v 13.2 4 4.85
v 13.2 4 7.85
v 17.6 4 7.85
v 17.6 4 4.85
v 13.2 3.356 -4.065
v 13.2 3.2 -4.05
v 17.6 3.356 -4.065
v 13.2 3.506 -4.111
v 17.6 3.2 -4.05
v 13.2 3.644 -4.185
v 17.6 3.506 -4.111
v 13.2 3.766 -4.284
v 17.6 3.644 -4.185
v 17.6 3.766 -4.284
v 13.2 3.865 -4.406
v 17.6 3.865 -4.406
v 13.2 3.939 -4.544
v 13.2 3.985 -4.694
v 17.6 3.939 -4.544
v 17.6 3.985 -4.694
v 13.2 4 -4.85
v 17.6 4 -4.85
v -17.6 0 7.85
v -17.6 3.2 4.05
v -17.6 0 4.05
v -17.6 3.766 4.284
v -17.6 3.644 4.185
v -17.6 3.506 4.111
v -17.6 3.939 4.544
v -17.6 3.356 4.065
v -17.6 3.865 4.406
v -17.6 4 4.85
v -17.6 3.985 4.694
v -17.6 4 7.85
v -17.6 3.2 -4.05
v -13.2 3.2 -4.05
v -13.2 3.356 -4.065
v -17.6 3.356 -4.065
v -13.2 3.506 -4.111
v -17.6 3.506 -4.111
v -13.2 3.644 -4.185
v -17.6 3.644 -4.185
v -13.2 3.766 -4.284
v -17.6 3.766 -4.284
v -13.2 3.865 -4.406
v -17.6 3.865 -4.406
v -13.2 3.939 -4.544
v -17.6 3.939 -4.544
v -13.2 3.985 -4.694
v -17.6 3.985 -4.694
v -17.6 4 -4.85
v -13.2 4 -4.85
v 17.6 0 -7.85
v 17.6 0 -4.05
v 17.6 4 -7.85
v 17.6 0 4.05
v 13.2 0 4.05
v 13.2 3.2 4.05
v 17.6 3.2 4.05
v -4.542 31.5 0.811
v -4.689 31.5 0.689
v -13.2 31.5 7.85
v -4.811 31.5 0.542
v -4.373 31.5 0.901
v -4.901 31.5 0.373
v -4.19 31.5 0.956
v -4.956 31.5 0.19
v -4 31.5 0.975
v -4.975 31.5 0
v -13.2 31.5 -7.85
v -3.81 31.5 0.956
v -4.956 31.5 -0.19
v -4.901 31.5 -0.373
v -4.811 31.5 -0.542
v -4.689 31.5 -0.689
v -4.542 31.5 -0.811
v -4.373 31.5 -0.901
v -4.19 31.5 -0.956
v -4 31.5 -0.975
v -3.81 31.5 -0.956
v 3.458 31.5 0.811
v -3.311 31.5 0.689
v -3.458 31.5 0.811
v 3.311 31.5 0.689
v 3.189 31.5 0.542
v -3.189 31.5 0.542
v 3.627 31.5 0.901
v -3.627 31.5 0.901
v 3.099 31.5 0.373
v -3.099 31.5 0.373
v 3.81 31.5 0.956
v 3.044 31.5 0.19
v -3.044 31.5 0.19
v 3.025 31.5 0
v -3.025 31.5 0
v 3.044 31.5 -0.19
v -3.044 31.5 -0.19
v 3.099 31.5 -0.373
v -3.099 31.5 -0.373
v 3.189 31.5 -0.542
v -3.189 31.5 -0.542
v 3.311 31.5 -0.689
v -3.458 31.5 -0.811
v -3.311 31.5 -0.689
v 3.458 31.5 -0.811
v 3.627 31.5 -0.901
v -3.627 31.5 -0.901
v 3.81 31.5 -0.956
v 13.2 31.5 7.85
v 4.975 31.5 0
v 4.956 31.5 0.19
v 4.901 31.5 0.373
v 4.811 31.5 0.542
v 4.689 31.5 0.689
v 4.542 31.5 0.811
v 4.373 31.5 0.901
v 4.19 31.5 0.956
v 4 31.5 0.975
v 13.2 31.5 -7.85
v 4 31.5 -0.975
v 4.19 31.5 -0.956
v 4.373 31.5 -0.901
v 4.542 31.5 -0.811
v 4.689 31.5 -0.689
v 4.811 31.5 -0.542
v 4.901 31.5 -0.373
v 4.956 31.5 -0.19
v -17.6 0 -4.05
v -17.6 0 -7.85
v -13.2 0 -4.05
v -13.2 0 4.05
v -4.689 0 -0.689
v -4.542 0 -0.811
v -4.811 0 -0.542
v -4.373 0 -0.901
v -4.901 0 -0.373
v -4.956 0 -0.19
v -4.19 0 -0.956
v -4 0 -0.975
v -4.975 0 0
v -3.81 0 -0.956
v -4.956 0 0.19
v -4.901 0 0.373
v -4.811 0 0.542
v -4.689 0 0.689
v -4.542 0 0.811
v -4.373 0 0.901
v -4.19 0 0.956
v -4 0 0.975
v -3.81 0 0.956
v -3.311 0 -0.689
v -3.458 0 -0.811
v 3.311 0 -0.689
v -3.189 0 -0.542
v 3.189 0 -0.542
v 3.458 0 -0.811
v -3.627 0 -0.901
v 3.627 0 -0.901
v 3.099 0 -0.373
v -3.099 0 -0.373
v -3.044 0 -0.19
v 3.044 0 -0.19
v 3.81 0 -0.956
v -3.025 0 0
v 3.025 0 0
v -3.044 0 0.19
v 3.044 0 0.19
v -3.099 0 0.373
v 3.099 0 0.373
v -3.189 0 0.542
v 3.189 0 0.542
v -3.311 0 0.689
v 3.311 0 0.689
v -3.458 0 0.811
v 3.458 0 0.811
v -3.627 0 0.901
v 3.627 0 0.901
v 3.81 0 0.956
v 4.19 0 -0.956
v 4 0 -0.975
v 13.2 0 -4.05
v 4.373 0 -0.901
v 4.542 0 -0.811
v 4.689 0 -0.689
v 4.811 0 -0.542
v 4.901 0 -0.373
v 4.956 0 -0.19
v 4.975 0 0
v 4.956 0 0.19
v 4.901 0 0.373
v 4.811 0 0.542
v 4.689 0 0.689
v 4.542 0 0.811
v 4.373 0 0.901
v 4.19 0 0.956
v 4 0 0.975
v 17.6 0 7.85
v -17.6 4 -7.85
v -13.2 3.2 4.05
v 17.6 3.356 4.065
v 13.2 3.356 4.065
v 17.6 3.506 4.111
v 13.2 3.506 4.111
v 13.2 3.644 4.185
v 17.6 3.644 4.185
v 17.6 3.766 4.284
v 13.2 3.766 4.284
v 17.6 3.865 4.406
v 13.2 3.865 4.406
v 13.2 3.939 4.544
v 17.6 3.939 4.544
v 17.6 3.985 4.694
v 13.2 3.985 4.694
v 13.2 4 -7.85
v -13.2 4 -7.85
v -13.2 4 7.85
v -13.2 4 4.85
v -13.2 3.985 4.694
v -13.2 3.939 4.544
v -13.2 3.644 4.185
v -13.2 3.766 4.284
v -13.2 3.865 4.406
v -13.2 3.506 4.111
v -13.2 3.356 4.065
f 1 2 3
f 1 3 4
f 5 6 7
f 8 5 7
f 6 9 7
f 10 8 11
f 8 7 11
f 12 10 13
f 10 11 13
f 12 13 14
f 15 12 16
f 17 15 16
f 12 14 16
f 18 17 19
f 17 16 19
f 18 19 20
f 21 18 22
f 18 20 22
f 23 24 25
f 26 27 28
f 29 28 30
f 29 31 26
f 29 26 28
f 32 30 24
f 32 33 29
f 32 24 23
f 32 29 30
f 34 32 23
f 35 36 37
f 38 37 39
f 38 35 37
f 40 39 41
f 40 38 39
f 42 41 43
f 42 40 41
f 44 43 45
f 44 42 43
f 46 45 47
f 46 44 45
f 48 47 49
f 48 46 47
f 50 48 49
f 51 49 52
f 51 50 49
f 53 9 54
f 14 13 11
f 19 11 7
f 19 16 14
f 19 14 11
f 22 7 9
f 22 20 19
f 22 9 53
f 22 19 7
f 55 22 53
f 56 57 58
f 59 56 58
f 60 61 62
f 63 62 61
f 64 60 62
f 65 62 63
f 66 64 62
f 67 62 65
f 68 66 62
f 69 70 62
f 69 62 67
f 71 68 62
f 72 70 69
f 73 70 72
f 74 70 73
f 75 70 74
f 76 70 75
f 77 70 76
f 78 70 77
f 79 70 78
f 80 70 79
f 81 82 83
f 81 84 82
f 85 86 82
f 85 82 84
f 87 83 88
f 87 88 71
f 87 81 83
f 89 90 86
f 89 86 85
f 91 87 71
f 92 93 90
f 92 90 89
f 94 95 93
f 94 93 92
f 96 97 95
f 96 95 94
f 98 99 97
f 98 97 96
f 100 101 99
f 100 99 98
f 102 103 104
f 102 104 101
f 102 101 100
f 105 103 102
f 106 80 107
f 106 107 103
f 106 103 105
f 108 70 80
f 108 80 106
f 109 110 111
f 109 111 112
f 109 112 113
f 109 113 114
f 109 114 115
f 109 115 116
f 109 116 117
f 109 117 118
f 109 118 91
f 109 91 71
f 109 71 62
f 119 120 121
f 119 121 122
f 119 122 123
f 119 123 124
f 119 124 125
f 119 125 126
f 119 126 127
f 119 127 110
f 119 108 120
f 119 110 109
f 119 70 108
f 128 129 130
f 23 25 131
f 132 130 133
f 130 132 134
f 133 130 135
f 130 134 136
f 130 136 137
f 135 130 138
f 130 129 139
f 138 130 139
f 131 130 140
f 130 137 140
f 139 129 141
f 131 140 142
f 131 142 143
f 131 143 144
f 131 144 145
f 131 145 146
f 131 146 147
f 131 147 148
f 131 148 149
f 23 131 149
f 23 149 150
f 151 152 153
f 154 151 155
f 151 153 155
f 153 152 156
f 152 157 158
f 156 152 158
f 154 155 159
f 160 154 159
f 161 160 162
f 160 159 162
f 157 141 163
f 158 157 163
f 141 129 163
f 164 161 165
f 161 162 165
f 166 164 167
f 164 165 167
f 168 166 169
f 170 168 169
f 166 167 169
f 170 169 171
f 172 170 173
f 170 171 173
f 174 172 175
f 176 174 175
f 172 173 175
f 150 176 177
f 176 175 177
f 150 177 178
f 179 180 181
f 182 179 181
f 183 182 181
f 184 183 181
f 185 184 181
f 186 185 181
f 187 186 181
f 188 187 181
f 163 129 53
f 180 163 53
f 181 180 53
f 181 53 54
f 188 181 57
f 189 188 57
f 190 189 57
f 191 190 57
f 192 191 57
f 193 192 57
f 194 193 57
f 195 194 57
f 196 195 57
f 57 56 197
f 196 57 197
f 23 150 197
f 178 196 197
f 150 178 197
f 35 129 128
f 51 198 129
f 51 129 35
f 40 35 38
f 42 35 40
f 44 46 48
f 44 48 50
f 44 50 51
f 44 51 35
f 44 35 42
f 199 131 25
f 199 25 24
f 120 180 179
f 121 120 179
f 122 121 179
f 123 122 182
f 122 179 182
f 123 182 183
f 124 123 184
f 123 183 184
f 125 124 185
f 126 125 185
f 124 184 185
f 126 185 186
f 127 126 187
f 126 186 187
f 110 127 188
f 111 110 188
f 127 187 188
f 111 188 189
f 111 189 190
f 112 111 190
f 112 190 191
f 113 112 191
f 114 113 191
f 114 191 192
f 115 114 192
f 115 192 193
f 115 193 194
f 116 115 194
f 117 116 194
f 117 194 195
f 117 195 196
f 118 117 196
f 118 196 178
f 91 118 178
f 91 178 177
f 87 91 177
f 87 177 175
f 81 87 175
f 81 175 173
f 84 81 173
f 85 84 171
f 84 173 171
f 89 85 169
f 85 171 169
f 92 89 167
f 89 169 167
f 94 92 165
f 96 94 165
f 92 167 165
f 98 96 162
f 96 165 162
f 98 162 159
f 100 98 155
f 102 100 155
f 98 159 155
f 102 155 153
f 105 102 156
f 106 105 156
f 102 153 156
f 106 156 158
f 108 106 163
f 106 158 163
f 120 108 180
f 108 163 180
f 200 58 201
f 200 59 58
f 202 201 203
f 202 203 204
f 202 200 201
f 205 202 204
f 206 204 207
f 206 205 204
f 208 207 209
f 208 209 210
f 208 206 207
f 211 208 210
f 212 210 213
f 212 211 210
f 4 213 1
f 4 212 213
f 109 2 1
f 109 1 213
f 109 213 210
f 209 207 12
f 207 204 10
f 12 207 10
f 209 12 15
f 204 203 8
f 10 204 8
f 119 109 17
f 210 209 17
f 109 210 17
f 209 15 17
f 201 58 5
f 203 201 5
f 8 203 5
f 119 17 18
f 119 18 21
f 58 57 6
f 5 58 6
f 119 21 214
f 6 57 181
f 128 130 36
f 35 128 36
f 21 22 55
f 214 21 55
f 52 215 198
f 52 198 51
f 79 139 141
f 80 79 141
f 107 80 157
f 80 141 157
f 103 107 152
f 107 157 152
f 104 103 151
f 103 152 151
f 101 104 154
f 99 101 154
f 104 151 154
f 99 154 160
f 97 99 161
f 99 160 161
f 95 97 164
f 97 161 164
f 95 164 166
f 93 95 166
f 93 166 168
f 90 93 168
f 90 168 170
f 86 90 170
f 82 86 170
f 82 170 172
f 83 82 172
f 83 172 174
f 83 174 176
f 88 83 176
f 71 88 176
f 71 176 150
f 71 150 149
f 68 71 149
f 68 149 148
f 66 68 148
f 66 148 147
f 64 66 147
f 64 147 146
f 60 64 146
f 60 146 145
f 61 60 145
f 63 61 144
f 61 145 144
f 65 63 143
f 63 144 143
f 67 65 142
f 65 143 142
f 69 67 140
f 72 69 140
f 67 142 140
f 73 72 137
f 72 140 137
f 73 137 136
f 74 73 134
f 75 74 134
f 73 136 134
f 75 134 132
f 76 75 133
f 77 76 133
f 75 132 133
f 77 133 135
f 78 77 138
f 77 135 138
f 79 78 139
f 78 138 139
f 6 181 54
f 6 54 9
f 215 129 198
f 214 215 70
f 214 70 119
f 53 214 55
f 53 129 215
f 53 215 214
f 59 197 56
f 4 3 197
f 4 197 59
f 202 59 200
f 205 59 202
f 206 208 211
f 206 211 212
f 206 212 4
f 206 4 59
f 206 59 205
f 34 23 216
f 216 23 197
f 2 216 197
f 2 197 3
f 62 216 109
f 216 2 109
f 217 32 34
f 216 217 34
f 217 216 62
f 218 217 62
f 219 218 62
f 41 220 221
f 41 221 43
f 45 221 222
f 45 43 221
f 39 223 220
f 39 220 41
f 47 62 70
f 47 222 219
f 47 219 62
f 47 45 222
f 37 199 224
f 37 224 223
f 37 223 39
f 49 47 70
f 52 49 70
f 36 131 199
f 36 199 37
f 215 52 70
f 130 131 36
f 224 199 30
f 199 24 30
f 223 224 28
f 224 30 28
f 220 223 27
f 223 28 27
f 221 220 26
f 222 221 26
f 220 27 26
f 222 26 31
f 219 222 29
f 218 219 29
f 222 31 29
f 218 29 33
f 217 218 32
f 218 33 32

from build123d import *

# Parameters (mm, degrees)
SKETCH_1_W          = 26.4
SKETCH_1_H          = 15.7
EXTRUDE_1_DEPTH     = 31.5
SKETCH_2_W          = 3.8
SKETCH_2_H          = 4
EXTRUDE_2_DEPTH     = 4.4
SKETCH_3_W          = 3.8
SKETCH_3_H          = 4
EXTRUDE_3_DEPTH     = 4.4
SKETCH_4_R          = 0.975
CUT_EXTRUDE_1_DEPTH = 37.92739498
FILLET_1_R          = 0.8


with BuildPart() as part:
    # ｽｹｯﾁ1 → ﾎﾞｽ - 押し出し1 (new body)
    with BuildSketch(Plane(origin=(0, 0, 0), x_dir=(1, 0, 0), z_dir=(0, 1, 0))):
        Rectangle(SKETCH_1_W, SKETCH_1_H)
    extrude(amount=EXTRUDE_1_DEPTH)

    # ｽｹｯﾁ2 → ﾎﾞｽ - 押し出し2 (add)
    with BuildSketch(Plane(origin=(13.2, 0, 0), x_dir=(0, 0, -1), z_dir=(1, 0, 0))):
        with Locations((-5.95, 2)):
            Rectangle(SKETCH_2_W, SKETCH_2_H)
        with Locations((5.95, 2)):
            Rectangle(SKETCH_2_W, SKETCH_2_H)
    extrude(amount=EXTRUDE_2_DEPTH)

    # ｽｹｯﾁ3 → ﾎﾞｽ - 押し出し3 (add)
    with BuildSketch(Plane.ZY.offset(13.2)):
        with Locations((5.95, 2)):
            Rectangle(SKETCH_3_W, SKETCH_3_H)
        with Locations((-5.95, 2)):
            Rectangle(SKETCH_3_W, SKETCH_3_H)
    extrude(amount=EXTRUDE_3_DEPTH)

    # ｽｹｯﾁ4 → ｶｯﾄ - 押し出し1 (cut, through all)
    with BuildSketch(Plane.XZ):
        with Locations(Location((4, 0, 0), (0, 0, 270))):
            Circle(SKETCH_4_R)
        with Locations(Location((-4, 0, 0), (0, 0, 270))):
            Circle(SKETCH_4_R)
    extrude(amount=-CUT_EXTRUDE_1_DEPTH, mode=Mode.SUBTRACT)

    # ﾌｨﾚｯﾄ1
    fillet_1_edges = [part.edges().sort_by_distance(p)[0] for p in [
        (15.4, 4, 4.05),
        (15.4, 4, -4.05),
        (-15.4, 4, 4.05),
        (-15.4, 4, -4.05),
    ]]
    fillet(fillet_1_edges, radius=FILLET_1_R)


solid = part.part
